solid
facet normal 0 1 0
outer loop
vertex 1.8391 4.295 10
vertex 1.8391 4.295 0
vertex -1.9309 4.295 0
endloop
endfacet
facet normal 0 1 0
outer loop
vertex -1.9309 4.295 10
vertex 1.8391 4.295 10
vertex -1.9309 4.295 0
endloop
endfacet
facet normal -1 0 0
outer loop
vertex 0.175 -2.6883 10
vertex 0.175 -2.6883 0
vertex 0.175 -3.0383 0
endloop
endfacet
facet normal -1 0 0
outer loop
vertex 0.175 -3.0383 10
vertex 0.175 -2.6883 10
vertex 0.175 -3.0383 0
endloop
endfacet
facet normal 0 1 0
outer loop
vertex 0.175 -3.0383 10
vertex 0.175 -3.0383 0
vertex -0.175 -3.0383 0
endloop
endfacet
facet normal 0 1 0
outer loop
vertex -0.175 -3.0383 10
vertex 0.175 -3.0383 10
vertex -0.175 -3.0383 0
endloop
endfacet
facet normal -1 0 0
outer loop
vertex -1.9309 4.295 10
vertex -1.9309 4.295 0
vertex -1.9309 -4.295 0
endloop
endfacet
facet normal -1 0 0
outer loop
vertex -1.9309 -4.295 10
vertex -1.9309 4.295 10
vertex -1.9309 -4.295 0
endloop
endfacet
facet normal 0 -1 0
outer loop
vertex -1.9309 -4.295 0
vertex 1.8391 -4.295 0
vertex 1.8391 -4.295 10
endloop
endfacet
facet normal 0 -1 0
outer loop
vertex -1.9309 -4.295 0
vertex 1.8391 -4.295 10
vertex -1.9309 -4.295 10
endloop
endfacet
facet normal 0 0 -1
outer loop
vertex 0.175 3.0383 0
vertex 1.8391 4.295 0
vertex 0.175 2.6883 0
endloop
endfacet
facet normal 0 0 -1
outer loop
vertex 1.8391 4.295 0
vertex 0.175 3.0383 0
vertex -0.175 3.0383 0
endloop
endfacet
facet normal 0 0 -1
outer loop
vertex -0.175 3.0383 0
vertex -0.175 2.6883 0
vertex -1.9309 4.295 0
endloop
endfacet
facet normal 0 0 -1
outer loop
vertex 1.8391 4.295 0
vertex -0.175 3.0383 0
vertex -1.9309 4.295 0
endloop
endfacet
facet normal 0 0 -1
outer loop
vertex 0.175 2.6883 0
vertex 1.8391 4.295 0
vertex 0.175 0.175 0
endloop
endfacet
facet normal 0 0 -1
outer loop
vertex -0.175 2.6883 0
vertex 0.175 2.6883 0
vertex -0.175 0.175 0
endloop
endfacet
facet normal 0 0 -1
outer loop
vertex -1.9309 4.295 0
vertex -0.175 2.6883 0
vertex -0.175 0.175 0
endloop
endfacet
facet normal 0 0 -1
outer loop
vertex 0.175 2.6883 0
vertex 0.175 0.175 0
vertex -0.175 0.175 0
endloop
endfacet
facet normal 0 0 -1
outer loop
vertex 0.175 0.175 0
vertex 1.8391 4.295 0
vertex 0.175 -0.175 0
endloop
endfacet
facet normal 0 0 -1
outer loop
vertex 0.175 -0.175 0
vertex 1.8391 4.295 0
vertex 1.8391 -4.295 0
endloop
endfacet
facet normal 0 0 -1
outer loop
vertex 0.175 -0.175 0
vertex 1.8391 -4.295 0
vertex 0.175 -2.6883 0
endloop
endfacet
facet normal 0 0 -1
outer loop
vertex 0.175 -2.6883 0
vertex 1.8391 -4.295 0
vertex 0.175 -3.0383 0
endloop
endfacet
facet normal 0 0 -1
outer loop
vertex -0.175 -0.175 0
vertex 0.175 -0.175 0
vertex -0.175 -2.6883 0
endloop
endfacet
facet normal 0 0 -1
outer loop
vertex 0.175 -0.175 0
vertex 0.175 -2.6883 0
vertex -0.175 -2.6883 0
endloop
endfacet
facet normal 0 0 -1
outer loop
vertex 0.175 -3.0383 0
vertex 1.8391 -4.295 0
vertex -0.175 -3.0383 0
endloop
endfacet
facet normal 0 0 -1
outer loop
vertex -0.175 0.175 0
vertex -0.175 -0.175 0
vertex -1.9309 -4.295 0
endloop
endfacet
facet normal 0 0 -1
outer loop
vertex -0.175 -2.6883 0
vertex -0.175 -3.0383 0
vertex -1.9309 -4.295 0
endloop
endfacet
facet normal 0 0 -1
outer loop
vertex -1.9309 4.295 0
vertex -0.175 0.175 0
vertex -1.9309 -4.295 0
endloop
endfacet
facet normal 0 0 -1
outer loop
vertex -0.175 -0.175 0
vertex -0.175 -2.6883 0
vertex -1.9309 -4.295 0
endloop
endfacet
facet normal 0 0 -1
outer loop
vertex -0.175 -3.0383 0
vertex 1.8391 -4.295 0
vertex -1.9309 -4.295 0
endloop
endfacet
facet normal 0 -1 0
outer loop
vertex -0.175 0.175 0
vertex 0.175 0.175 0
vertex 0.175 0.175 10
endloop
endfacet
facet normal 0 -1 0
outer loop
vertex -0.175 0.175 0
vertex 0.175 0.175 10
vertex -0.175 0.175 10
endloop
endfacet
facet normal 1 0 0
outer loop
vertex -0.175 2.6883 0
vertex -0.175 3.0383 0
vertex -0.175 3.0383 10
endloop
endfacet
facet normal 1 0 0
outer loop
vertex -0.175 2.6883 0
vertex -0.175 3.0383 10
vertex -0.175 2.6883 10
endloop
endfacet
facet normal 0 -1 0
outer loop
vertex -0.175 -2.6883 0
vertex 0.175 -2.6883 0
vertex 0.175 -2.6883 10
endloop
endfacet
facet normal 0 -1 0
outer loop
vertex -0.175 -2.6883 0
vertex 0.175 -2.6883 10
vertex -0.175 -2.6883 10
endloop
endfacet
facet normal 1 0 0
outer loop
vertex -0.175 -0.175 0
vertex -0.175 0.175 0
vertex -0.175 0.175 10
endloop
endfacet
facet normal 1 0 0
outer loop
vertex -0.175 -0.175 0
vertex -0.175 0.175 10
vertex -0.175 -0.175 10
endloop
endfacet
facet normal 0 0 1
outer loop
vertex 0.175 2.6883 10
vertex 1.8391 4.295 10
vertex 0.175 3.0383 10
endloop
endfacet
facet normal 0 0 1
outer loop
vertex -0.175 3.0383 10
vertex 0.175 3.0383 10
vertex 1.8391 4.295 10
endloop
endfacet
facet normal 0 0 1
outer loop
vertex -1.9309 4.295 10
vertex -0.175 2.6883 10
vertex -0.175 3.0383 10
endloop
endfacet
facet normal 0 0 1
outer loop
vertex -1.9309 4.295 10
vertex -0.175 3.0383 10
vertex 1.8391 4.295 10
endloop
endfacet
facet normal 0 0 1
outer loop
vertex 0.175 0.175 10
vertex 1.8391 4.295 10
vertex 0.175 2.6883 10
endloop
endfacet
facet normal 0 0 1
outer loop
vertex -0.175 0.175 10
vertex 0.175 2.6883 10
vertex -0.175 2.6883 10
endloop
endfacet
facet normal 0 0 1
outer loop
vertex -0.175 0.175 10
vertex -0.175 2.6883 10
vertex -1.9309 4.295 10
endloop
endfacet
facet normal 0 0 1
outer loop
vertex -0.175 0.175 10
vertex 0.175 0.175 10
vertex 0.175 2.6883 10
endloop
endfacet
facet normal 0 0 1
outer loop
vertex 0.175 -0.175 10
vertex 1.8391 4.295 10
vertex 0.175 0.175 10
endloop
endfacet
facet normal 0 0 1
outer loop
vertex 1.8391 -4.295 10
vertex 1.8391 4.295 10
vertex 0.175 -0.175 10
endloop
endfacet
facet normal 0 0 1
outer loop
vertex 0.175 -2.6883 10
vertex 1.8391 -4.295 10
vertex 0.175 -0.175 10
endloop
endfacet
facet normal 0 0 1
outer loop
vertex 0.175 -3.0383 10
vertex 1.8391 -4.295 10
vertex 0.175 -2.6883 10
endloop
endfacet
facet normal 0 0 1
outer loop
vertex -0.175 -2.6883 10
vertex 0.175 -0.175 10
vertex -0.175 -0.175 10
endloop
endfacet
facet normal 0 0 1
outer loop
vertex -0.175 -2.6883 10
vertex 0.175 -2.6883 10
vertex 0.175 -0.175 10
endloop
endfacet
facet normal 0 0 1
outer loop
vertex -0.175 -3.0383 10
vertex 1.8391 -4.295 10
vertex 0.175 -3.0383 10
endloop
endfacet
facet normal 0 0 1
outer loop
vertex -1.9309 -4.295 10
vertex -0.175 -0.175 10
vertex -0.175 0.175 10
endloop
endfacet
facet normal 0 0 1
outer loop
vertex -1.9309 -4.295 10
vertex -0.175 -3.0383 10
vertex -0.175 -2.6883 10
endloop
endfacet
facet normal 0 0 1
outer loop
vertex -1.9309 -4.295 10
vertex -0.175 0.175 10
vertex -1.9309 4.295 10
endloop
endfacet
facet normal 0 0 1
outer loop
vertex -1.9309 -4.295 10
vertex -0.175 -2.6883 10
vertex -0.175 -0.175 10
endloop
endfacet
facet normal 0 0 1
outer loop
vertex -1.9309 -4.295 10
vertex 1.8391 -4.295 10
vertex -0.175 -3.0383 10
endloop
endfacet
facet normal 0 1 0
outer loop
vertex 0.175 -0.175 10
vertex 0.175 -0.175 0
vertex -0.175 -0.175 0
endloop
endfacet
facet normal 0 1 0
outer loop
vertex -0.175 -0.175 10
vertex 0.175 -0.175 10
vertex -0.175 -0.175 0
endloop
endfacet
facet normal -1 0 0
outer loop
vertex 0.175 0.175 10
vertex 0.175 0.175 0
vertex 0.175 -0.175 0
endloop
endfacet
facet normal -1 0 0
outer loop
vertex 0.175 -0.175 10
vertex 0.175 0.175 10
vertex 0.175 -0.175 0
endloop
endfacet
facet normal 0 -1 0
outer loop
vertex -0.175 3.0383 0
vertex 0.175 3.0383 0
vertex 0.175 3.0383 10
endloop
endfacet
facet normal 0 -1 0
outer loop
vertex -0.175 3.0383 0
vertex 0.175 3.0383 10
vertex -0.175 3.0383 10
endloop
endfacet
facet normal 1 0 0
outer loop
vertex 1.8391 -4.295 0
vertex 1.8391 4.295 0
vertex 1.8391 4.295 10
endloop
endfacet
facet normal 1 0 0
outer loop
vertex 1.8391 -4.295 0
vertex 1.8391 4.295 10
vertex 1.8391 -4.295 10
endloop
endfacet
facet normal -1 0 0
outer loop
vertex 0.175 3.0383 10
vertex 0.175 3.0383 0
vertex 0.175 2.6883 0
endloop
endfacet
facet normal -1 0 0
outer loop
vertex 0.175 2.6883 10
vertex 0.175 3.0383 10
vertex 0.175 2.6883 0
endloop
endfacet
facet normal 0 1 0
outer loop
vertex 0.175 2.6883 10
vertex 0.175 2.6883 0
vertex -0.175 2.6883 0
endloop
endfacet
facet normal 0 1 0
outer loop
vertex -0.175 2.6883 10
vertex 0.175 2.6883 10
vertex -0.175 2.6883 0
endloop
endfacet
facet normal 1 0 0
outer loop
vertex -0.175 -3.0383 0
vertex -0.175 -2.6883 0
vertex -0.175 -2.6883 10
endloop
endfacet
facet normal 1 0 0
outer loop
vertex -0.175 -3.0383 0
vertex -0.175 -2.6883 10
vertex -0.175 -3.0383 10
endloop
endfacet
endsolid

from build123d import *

# Parameters (mm, degrees)
SKETCH2_W           = 3.77
SKETCH2_H           = 8.59
SKETCH2_W_2         = 0.35
SKETCH2_H_2         = 0.35
BOSS_EXTRUDE1_DEPTH = 10


with BuildPart() as part:
    # Sketch2 → Boss-Extrude1 (new body)
    with BuildSketch(Plane(origin=(0, 0, 0), x_dir=(-1, 0, 0), z_dir=(0, 0, 1))):
        with Locations((0.045949122, 0)):
            Rectangle(SKETCH2_W, SKETCH2_H)
        with Locations((0, -2.8633)):
            Rectangle(SKETCH2_W_2, SKETCH2_H_2, mode=Mode.SUBTRACT)
        Rectangle(SKETCH2_W_2, SKETCH2_H_2, mode=Mode.SUBTRACT)
        with Locations((0, 2.8633)):
            Rectangle(SKETCH2_W_2, SKETCH2_H_2, mode=Mode.SUBTRACT)
    extrude(amount=BOSS_EXTRUDE1_DEPTH)


solid = part.part
